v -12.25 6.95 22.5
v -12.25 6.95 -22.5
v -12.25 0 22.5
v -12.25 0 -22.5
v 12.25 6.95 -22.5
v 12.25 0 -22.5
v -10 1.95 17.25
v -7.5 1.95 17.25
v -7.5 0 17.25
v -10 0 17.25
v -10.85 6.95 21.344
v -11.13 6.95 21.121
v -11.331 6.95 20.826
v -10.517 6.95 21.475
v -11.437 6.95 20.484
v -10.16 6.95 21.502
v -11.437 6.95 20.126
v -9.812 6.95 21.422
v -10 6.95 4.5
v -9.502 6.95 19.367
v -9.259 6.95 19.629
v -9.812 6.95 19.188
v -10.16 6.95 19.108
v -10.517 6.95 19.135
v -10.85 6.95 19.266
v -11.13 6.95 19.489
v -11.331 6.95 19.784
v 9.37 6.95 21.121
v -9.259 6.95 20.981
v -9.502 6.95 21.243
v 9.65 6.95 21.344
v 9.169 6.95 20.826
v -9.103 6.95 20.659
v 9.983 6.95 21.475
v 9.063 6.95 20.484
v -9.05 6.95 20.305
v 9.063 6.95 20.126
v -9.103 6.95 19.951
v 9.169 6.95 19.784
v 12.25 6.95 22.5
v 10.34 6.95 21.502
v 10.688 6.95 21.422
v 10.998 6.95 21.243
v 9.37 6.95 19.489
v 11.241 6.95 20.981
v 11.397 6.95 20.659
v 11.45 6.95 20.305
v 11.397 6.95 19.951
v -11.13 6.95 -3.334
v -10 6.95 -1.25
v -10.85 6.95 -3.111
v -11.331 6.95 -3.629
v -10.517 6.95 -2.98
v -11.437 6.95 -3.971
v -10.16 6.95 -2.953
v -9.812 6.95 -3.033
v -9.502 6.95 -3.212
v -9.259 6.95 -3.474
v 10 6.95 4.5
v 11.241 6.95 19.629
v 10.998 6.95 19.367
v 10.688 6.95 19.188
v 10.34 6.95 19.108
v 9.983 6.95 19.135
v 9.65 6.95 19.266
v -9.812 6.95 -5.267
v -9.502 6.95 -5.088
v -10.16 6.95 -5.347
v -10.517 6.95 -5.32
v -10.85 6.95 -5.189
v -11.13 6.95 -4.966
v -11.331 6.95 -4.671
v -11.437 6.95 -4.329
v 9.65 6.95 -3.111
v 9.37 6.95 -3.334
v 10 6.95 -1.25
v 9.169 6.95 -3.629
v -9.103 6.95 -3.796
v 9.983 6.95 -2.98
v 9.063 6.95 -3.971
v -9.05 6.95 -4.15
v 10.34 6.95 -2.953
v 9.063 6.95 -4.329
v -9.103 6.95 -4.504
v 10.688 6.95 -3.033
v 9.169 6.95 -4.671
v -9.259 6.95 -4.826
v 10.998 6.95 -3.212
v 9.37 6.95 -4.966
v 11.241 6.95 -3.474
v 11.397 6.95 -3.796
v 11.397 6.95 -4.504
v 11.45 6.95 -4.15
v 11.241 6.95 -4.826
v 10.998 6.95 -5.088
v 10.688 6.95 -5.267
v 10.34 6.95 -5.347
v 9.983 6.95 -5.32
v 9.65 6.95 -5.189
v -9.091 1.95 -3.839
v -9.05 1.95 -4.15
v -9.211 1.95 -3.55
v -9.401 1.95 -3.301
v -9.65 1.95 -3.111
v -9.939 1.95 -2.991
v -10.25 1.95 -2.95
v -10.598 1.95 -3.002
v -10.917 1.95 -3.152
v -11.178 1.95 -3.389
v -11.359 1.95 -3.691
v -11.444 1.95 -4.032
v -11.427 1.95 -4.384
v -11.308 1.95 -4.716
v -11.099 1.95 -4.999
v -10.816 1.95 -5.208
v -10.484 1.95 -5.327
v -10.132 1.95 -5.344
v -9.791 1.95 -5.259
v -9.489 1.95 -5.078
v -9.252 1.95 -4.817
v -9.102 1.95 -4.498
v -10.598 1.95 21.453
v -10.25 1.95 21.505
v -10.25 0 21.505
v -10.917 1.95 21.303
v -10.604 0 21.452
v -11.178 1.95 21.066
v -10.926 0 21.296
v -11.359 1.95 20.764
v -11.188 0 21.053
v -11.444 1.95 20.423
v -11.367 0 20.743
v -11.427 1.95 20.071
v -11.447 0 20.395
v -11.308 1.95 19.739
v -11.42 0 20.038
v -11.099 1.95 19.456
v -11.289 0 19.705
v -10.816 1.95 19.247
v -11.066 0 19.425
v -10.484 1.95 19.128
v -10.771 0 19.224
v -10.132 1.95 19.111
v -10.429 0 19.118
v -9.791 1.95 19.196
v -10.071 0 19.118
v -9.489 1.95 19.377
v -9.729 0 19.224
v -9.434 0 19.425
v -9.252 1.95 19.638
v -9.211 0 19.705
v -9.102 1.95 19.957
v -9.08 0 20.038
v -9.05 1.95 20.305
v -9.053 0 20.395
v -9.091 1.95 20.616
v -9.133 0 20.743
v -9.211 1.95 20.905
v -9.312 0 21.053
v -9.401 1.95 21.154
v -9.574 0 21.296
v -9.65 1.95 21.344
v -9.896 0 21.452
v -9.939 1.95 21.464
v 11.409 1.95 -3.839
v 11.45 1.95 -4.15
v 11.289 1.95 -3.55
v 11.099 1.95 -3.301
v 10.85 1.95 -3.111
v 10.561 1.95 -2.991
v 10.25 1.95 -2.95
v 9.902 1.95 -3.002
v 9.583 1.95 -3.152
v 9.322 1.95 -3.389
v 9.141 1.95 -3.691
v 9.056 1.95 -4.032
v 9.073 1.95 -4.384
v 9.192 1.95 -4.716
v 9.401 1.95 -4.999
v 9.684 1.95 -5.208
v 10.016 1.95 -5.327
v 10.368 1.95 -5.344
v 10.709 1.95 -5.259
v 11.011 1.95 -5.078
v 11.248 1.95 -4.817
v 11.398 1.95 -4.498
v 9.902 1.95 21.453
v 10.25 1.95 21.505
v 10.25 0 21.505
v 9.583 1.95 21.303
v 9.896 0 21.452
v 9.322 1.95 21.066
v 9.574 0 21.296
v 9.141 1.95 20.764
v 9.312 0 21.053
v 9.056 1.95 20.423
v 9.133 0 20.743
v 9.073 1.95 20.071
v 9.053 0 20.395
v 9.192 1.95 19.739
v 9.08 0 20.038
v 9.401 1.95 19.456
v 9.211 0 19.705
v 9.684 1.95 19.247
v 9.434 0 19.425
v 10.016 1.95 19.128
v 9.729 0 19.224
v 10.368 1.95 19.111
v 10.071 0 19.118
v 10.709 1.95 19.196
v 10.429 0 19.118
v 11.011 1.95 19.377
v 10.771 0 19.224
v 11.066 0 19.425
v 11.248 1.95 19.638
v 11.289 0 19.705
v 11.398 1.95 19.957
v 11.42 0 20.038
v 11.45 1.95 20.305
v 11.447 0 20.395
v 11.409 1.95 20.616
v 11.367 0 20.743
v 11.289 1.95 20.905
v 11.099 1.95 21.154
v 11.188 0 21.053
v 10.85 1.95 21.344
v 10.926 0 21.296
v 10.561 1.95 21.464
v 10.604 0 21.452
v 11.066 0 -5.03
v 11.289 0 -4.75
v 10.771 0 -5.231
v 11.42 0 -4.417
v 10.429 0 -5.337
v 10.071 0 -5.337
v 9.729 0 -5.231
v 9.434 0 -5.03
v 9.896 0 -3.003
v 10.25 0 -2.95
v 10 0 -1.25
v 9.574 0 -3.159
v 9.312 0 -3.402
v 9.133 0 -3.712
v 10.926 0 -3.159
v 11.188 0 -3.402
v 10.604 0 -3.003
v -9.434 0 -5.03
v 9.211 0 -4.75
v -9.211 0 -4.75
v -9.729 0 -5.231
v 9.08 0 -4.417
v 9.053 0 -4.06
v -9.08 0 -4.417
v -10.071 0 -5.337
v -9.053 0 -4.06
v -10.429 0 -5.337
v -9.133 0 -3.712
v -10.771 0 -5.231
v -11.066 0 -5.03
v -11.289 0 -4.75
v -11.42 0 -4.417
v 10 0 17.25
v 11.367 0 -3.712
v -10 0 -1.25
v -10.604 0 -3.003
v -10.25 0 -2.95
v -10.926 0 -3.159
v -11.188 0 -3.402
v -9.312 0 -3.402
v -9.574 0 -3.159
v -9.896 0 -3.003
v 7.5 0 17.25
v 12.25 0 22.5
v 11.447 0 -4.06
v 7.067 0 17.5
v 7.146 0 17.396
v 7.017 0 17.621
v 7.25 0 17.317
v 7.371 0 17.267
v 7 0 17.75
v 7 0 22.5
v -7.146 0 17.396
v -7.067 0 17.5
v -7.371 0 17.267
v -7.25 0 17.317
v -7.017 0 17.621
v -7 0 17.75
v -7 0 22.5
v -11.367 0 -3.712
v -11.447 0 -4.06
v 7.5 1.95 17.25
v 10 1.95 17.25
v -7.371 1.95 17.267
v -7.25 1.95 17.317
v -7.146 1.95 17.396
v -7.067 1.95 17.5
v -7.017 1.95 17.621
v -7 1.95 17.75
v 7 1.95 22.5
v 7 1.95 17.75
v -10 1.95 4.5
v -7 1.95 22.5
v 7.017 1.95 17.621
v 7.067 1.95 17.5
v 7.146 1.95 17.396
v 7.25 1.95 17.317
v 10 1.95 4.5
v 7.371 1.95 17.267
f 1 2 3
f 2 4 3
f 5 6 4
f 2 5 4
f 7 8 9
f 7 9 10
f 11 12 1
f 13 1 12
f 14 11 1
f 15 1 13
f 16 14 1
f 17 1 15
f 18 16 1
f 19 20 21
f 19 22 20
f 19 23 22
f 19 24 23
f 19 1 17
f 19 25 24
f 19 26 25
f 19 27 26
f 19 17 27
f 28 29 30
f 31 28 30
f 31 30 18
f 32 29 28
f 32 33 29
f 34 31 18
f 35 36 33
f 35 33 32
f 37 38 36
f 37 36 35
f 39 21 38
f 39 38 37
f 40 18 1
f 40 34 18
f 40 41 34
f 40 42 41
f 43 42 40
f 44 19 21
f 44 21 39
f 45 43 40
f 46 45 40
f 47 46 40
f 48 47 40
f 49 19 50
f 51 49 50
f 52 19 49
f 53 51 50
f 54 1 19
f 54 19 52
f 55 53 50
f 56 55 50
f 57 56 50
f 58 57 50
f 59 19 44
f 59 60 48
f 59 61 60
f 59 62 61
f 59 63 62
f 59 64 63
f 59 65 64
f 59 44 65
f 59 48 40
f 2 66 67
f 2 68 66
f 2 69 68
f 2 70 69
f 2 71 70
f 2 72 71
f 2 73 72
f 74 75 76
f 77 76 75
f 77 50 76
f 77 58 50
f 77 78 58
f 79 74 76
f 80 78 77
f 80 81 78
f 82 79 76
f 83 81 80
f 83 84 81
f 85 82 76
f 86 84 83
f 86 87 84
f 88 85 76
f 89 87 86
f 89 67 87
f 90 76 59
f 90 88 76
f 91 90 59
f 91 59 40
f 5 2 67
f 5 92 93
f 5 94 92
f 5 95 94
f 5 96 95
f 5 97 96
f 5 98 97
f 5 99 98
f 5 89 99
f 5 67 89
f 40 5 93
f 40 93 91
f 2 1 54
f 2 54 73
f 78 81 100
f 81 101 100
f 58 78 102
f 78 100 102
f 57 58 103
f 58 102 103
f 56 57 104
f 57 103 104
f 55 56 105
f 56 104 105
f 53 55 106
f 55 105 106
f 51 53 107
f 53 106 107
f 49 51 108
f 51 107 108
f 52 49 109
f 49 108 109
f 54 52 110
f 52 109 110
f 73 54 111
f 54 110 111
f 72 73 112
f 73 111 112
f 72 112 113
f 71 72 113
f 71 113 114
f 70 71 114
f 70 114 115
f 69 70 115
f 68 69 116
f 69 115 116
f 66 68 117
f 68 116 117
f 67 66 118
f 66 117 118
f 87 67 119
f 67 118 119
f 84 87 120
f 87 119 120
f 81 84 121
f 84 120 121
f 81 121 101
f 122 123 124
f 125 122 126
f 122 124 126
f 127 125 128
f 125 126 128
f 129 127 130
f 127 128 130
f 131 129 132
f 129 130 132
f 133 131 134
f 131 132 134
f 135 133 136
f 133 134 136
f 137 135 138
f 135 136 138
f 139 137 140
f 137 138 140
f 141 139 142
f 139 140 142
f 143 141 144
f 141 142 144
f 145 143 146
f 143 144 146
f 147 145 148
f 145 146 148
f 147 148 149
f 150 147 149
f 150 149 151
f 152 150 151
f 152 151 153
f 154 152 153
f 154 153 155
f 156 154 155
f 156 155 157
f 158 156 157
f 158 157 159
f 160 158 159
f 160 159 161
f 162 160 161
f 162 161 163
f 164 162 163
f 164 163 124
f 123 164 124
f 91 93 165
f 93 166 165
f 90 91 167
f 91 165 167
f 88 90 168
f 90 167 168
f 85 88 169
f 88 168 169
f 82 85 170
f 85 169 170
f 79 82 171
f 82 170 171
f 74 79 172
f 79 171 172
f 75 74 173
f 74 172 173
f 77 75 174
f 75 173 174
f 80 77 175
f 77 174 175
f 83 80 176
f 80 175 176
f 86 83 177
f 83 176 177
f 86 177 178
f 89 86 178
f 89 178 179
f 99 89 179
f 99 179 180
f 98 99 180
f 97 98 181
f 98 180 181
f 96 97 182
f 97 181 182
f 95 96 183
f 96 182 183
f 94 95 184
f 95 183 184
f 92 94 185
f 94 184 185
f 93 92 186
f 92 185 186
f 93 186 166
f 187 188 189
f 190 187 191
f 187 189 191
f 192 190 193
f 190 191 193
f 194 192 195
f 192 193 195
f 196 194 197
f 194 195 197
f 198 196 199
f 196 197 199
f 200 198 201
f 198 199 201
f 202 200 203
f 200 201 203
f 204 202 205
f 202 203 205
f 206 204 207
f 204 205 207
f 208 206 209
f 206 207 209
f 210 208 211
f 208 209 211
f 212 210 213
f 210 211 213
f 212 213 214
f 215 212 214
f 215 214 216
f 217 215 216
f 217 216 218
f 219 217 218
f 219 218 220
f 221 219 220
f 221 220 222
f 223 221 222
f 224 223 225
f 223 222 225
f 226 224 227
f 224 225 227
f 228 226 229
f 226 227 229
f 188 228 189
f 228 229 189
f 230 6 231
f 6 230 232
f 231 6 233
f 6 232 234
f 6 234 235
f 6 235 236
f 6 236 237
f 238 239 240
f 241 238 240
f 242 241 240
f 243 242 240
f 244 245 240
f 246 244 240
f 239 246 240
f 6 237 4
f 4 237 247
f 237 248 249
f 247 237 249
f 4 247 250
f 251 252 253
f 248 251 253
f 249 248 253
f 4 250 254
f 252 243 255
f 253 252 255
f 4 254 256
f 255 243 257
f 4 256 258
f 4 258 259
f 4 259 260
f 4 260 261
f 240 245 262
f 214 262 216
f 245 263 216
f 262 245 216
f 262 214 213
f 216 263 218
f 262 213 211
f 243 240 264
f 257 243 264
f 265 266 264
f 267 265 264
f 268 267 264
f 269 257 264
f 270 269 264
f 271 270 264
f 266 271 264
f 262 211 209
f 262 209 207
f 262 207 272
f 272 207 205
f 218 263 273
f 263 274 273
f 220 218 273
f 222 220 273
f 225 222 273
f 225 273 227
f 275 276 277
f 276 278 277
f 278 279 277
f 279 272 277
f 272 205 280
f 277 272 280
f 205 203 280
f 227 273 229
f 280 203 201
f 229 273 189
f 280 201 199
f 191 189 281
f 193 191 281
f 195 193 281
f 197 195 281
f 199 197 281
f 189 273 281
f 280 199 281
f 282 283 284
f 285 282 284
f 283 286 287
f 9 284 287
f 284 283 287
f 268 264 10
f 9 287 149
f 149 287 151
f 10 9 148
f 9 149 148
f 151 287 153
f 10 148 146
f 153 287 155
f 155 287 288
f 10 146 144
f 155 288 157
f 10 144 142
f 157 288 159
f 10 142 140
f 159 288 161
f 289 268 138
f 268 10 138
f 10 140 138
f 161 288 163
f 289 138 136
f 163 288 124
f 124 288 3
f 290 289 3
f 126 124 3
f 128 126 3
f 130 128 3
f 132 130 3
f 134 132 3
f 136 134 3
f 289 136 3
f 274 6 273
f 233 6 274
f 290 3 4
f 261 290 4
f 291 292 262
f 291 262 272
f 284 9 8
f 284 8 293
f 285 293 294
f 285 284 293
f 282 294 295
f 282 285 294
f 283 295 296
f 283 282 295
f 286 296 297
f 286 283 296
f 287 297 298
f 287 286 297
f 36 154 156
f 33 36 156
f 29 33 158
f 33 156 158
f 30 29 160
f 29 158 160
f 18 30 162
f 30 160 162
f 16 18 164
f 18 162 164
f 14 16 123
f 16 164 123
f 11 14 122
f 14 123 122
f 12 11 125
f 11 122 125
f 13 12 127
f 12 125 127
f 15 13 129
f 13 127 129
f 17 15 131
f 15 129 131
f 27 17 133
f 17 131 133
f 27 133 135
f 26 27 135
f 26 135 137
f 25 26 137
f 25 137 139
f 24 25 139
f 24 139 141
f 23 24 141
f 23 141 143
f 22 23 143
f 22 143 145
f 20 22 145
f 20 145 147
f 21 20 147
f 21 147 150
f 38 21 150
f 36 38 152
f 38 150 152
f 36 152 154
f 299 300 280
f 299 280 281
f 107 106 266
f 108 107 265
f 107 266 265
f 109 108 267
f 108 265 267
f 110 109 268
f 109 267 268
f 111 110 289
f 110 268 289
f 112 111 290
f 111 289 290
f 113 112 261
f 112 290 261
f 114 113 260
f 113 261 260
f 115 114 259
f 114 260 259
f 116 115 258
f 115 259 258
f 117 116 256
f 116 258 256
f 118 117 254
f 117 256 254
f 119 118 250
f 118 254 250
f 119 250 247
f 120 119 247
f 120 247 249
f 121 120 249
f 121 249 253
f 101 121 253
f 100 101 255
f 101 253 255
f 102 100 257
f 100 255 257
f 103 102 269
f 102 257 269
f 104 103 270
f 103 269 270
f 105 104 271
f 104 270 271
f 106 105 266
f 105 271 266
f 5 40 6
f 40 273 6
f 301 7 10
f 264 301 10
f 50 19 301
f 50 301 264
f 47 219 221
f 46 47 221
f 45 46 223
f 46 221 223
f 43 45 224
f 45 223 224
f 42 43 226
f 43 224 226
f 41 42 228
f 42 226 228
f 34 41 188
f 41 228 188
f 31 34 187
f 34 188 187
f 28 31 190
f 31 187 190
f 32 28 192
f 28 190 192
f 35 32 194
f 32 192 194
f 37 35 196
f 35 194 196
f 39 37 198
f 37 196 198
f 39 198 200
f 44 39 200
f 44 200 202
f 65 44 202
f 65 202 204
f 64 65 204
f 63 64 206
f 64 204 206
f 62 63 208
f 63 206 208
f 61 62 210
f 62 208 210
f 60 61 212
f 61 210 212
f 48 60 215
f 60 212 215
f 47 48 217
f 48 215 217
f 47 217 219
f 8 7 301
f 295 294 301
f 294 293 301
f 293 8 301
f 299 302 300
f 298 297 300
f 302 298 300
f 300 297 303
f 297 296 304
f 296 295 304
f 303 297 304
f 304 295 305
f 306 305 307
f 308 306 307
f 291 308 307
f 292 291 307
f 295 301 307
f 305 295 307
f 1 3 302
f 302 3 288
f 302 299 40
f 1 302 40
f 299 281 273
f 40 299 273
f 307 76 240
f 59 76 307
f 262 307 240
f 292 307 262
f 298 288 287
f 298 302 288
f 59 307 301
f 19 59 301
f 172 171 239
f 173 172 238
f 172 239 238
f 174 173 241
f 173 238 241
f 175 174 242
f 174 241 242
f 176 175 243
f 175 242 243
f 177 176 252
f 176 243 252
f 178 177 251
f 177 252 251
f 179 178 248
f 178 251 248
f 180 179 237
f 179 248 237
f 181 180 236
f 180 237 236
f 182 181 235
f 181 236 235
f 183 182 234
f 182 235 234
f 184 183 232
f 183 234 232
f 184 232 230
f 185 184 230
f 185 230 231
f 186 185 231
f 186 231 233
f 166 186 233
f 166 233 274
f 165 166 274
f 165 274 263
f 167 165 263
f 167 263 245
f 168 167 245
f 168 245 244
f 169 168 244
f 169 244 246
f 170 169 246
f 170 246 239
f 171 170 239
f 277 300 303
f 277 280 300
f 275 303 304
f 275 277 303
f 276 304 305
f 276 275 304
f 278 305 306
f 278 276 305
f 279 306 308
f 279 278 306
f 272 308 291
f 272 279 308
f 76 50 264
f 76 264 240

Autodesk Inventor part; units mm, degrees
ref_plane "YZ Plane" through (0, 0, 0) normal (1, 0, 0) x (0, 1, 0)
ref_plane "XZ Plane" through (0, 0, 0) normal (0, 1, 0) x (-1, 0, 0)
ref_plane "XY Plane" through (0, 0, 0) normal (0, 0, 1) x (1, 0, 0)
sketch "Sketch1" plane through (0, 0, 0) normal (0, 1, 0) x (-1, 0, 0)
  line L0 (12.25, 22.5) -> (-12.25, 22.5)
  line L1 (-12.25, 22.5) -> (-12.25, -22.5)
  line L2 (-12.25, -22.5) -> (12.25, -22.5)
  line L3 (12.25, -22.5) -> (12.25, 22.5)
  point P0 (0, 0)
  point P1 (12.25, 0)
  point P2 (0, 22.5)
  dimension "d0" = 24.5
  dimension "d1" = 45
extrude "Extrusion1" add sketch "Sketch1" along normal blind 1.95
sketch "Sketch2" plane through (0, 1.95, 0) normal (0, 1, 0) x (1, 0, 0)
  line L0 (-10, 1.25) -> (10, 1.25)
  line L1 (10, 1.25) -> (10, -17.25)
  line L2 (10, -17.25) -> (-10, -17.25)
  line L3 (-10, -17.25) -> (-10, 1.25)
  line L4 (-12.25, -22.5) -> (12.25, -22.5) projected
  line L5 (12.25, -22.5) -> (12.25, 22.5) projected
  line L6 (12.25, 22.5) -> (-12.25, 22.5) projected
  line L7 (-12.25, 22.5) -> (-12.25, -22.5) projected
  line L8 (-7, -17.25) -> (7, -17.25)
  line L9 (7, -17.25) -> (7, -22.5)
  line L10 (7, -22.5) -> (-7, -22.5)
  line L11 (-7, -22.5) -> (-7, -17.25)
  line L12 (-12.25, -22.5) -> (12.25, -22.5) projected
  point P0 (0, 0)
  dimension "d4" = 2.25
  dimension "d5" = 20
  dimension "d6" = 2.25
  dimension "d7" = 5.25
  dimension "d8" = 5.25
  dimension "d9" = 14
  dimension "d10" = 5.25
  dimension "d11" = 18.5
extrude "Extrusion2" cut sketch "Sketch2" against normal up to surface (1.95 mm away) contours L0 L1 L2 L3 | L2 L9 L4 L11
sketch "Sketch3" plane through (0, 1.95, 0) normal (0, 1, 0) x (1, 0, 0)
  line L0 (-7, -22.5) -> (-7, -17.25) projected
  line L1 (-7, -17.25) -> (-10, -17.25) projected
  line L2 (-10, -17.25) -> (-10, 1.25) projected
  line L3 (-10, 1.25) -> (10, 1.25) projected
  line L4 (10, 1.25) -> (10, -17.25) projected
  line L5 (10, -17.25) -> (7, -17.25) projected
  line L6 (7, -17.25) -> (7, -22.5) projected
  line L7 (7, -22.5) -> (12.25, -22.5) projected
  line L8 (12.25, -22.5) -> (12.25, 22.5) projected
  line L9 (12.25, 22.5) -> (-12.25, 22.5) projected
  line L10 (-12.25, 22.5) -> (-12.25, -22.5) projected
  line L11 (-12.25, -22.5) -> (-7, -22.5) projected
  point P0 (0, 0)
  point P1 (-10.25, -20.305)
  point P2 (10.25, -20.305)
  dimension "d14" = 20.5
  dimension "d15" = 2
  dimension "d16" = 2.195
  dimension "d17" = 2
hole "Hole1" at (-10.25, 1.95, 20.305) at (10.25, 1.95, 20.305) direction (0, -1, 0) diameter 2.4 end through all clearance for "Flat Head Machine Screw" size "M2" standard "Ansi Metric M Profile"
sketch "Sketch4" plane through (0, 1.95, 0) normal (0, 1, 0) x (1, 0, 0)
  circle A0 centre (-10.25, -20.305) radius 1.2 projected
  circle A1 centre (10.25, -20.305) radius 1.2 projected
  line L0 (-7, -22.5) -> (-7, -17.25) projected
  line L1 (-7, -17.25) -> (-10, -17.25) projected
  line L2 (-10, -17.25) -> (-10, 1.25) projected
  line L3 (-10, 1.25) -> (10, 1.25) projected
  line L4 (10, 1.25) -> (10, -17.25) projected
  line L5 (10, -17.25) -> (7, -17.25) projected
  line L6 (7, -17.25) -> (7, -22.5) projected
  line L7 (7, -22.5) -> (12.25, -22.5) projected
  line L8 (12.25, -22.5) -> (12.25, 22.5) projected
  line L9 (12.25, 22.5) -> (-12.25, 22.5) projected
  line L10 (-12.25, 22.5) -> (-12.25, -22.5) projected
  line L11 (-12.25, -22.5) -> (-7, -22.5) projected
  point P0 (0, 0)
  point P1 (-10.25, 4.15)
  point P2 (10.25, 4.15)
  dimension "d25" = 20.5
  dimension "d26" = 26.65
  dimension "d27" = 2
  dimension "d28" = 2
hole "Hole2" at (-10.25, 1.95, -4.15) at (10.25, 1.95, -4.15) direction (0, -1, 0) diameter 2.4 end through all clearance for "Flat Head Machine Screw" size "M2" standard "Ansi Metric M Profile"
fillet "Fillet1" radius 0.5 2 edges at (7, 0.975, 17.25) (-7, 0.975, 17.25)
sketch "Sketch5" plane through (0, 1.95, 0) normal (0, 1, 0) x (1, 0, 0)
  circle A0 centre (-10.25, 4.15) radius 1.2 projected
  circle A1 centre (10.25, 4.15) radius 1.2 projected
  circle A2 centre (-10.25, -20.305) radius 1.2 projected
  circle A3 centre (10.25, -20.305) radius 1.2 projected
  arc A4 (-7, -17.75) -> (-7.5, -17.25) centre (-7.5, -17.75) ccw projected
  line L0 (-7.5, -17.25) -> (-10, -17.25) projected
  line L1 (-10, -17.25) -> (-10, 1.25) projected
  line L2 (-10, 1.25) -> (10, 1.25) projected
  line L3 (10, 1.25) -> (10, -17.25) projected
  line L4 (10, -17.25) -> (7.5, -17.25) projected
  arc A5 (7.5, -17.25) -> (7, -17.75) centre (7.5, -17.75) ccw projected
  line L5 (7, -17.75) -> (7, -22.5) projected
  line L6 (7, -22.5) -> (12.25, -22.5) projected
  line L7 (12.25, -22.5) -> (12.25, 22.5) projected
  line L8 (12.25, 22.5) -> (-12.25, 22.5) projected
  line L9 (-12.25, 22.5) -> (-12.25, -22.5) projected
  line L10 (-12.25, -22.5) -> (-7, -22.5) projected
  line L11 (-7, -22.5) -> (-7, -17.75) projected
  line L12 (-12.25, 22.5) -> (-12.25, -22.5) projected
  line L13 (12.25, -22.5) -> (12.25, 22.5) projected
  line L14 (-12.25, -22.5) -> (12.25, -22.5)
  line L15 (12.25, -22.5) -> (12.25, -4.5)
  line L16 (12.25, -4.5) -> (10, -4.5)
  line L17 (-12.25, -4.5) -> (-12.25, -22.5)
  line L18 (-10, -4.5) -> (-12.25, -4.5)
  line L19 (10, -4.5) -> (-10, -4.5)
  point P0 (0, 0)
  dimension "d37" = 18
extrude "Extrusion3" add sketch "Sketch5" along normal blind 5 contours L11 L10 L9 L18 L1 L0 A4 | A4 L0 L1 L19 L3 L4 A5 L5 L14 L11 | L5 A5 L4 L3 L16 L7 L6 | L18 L9 L8 L7 L16 L3 L2 L1
equation "\"d4\" = d6"
equation "\"d8\" = d10"
equation "\"d15\" = d17"
equation "\"d27\" = d28"
properties part number "servotest"
